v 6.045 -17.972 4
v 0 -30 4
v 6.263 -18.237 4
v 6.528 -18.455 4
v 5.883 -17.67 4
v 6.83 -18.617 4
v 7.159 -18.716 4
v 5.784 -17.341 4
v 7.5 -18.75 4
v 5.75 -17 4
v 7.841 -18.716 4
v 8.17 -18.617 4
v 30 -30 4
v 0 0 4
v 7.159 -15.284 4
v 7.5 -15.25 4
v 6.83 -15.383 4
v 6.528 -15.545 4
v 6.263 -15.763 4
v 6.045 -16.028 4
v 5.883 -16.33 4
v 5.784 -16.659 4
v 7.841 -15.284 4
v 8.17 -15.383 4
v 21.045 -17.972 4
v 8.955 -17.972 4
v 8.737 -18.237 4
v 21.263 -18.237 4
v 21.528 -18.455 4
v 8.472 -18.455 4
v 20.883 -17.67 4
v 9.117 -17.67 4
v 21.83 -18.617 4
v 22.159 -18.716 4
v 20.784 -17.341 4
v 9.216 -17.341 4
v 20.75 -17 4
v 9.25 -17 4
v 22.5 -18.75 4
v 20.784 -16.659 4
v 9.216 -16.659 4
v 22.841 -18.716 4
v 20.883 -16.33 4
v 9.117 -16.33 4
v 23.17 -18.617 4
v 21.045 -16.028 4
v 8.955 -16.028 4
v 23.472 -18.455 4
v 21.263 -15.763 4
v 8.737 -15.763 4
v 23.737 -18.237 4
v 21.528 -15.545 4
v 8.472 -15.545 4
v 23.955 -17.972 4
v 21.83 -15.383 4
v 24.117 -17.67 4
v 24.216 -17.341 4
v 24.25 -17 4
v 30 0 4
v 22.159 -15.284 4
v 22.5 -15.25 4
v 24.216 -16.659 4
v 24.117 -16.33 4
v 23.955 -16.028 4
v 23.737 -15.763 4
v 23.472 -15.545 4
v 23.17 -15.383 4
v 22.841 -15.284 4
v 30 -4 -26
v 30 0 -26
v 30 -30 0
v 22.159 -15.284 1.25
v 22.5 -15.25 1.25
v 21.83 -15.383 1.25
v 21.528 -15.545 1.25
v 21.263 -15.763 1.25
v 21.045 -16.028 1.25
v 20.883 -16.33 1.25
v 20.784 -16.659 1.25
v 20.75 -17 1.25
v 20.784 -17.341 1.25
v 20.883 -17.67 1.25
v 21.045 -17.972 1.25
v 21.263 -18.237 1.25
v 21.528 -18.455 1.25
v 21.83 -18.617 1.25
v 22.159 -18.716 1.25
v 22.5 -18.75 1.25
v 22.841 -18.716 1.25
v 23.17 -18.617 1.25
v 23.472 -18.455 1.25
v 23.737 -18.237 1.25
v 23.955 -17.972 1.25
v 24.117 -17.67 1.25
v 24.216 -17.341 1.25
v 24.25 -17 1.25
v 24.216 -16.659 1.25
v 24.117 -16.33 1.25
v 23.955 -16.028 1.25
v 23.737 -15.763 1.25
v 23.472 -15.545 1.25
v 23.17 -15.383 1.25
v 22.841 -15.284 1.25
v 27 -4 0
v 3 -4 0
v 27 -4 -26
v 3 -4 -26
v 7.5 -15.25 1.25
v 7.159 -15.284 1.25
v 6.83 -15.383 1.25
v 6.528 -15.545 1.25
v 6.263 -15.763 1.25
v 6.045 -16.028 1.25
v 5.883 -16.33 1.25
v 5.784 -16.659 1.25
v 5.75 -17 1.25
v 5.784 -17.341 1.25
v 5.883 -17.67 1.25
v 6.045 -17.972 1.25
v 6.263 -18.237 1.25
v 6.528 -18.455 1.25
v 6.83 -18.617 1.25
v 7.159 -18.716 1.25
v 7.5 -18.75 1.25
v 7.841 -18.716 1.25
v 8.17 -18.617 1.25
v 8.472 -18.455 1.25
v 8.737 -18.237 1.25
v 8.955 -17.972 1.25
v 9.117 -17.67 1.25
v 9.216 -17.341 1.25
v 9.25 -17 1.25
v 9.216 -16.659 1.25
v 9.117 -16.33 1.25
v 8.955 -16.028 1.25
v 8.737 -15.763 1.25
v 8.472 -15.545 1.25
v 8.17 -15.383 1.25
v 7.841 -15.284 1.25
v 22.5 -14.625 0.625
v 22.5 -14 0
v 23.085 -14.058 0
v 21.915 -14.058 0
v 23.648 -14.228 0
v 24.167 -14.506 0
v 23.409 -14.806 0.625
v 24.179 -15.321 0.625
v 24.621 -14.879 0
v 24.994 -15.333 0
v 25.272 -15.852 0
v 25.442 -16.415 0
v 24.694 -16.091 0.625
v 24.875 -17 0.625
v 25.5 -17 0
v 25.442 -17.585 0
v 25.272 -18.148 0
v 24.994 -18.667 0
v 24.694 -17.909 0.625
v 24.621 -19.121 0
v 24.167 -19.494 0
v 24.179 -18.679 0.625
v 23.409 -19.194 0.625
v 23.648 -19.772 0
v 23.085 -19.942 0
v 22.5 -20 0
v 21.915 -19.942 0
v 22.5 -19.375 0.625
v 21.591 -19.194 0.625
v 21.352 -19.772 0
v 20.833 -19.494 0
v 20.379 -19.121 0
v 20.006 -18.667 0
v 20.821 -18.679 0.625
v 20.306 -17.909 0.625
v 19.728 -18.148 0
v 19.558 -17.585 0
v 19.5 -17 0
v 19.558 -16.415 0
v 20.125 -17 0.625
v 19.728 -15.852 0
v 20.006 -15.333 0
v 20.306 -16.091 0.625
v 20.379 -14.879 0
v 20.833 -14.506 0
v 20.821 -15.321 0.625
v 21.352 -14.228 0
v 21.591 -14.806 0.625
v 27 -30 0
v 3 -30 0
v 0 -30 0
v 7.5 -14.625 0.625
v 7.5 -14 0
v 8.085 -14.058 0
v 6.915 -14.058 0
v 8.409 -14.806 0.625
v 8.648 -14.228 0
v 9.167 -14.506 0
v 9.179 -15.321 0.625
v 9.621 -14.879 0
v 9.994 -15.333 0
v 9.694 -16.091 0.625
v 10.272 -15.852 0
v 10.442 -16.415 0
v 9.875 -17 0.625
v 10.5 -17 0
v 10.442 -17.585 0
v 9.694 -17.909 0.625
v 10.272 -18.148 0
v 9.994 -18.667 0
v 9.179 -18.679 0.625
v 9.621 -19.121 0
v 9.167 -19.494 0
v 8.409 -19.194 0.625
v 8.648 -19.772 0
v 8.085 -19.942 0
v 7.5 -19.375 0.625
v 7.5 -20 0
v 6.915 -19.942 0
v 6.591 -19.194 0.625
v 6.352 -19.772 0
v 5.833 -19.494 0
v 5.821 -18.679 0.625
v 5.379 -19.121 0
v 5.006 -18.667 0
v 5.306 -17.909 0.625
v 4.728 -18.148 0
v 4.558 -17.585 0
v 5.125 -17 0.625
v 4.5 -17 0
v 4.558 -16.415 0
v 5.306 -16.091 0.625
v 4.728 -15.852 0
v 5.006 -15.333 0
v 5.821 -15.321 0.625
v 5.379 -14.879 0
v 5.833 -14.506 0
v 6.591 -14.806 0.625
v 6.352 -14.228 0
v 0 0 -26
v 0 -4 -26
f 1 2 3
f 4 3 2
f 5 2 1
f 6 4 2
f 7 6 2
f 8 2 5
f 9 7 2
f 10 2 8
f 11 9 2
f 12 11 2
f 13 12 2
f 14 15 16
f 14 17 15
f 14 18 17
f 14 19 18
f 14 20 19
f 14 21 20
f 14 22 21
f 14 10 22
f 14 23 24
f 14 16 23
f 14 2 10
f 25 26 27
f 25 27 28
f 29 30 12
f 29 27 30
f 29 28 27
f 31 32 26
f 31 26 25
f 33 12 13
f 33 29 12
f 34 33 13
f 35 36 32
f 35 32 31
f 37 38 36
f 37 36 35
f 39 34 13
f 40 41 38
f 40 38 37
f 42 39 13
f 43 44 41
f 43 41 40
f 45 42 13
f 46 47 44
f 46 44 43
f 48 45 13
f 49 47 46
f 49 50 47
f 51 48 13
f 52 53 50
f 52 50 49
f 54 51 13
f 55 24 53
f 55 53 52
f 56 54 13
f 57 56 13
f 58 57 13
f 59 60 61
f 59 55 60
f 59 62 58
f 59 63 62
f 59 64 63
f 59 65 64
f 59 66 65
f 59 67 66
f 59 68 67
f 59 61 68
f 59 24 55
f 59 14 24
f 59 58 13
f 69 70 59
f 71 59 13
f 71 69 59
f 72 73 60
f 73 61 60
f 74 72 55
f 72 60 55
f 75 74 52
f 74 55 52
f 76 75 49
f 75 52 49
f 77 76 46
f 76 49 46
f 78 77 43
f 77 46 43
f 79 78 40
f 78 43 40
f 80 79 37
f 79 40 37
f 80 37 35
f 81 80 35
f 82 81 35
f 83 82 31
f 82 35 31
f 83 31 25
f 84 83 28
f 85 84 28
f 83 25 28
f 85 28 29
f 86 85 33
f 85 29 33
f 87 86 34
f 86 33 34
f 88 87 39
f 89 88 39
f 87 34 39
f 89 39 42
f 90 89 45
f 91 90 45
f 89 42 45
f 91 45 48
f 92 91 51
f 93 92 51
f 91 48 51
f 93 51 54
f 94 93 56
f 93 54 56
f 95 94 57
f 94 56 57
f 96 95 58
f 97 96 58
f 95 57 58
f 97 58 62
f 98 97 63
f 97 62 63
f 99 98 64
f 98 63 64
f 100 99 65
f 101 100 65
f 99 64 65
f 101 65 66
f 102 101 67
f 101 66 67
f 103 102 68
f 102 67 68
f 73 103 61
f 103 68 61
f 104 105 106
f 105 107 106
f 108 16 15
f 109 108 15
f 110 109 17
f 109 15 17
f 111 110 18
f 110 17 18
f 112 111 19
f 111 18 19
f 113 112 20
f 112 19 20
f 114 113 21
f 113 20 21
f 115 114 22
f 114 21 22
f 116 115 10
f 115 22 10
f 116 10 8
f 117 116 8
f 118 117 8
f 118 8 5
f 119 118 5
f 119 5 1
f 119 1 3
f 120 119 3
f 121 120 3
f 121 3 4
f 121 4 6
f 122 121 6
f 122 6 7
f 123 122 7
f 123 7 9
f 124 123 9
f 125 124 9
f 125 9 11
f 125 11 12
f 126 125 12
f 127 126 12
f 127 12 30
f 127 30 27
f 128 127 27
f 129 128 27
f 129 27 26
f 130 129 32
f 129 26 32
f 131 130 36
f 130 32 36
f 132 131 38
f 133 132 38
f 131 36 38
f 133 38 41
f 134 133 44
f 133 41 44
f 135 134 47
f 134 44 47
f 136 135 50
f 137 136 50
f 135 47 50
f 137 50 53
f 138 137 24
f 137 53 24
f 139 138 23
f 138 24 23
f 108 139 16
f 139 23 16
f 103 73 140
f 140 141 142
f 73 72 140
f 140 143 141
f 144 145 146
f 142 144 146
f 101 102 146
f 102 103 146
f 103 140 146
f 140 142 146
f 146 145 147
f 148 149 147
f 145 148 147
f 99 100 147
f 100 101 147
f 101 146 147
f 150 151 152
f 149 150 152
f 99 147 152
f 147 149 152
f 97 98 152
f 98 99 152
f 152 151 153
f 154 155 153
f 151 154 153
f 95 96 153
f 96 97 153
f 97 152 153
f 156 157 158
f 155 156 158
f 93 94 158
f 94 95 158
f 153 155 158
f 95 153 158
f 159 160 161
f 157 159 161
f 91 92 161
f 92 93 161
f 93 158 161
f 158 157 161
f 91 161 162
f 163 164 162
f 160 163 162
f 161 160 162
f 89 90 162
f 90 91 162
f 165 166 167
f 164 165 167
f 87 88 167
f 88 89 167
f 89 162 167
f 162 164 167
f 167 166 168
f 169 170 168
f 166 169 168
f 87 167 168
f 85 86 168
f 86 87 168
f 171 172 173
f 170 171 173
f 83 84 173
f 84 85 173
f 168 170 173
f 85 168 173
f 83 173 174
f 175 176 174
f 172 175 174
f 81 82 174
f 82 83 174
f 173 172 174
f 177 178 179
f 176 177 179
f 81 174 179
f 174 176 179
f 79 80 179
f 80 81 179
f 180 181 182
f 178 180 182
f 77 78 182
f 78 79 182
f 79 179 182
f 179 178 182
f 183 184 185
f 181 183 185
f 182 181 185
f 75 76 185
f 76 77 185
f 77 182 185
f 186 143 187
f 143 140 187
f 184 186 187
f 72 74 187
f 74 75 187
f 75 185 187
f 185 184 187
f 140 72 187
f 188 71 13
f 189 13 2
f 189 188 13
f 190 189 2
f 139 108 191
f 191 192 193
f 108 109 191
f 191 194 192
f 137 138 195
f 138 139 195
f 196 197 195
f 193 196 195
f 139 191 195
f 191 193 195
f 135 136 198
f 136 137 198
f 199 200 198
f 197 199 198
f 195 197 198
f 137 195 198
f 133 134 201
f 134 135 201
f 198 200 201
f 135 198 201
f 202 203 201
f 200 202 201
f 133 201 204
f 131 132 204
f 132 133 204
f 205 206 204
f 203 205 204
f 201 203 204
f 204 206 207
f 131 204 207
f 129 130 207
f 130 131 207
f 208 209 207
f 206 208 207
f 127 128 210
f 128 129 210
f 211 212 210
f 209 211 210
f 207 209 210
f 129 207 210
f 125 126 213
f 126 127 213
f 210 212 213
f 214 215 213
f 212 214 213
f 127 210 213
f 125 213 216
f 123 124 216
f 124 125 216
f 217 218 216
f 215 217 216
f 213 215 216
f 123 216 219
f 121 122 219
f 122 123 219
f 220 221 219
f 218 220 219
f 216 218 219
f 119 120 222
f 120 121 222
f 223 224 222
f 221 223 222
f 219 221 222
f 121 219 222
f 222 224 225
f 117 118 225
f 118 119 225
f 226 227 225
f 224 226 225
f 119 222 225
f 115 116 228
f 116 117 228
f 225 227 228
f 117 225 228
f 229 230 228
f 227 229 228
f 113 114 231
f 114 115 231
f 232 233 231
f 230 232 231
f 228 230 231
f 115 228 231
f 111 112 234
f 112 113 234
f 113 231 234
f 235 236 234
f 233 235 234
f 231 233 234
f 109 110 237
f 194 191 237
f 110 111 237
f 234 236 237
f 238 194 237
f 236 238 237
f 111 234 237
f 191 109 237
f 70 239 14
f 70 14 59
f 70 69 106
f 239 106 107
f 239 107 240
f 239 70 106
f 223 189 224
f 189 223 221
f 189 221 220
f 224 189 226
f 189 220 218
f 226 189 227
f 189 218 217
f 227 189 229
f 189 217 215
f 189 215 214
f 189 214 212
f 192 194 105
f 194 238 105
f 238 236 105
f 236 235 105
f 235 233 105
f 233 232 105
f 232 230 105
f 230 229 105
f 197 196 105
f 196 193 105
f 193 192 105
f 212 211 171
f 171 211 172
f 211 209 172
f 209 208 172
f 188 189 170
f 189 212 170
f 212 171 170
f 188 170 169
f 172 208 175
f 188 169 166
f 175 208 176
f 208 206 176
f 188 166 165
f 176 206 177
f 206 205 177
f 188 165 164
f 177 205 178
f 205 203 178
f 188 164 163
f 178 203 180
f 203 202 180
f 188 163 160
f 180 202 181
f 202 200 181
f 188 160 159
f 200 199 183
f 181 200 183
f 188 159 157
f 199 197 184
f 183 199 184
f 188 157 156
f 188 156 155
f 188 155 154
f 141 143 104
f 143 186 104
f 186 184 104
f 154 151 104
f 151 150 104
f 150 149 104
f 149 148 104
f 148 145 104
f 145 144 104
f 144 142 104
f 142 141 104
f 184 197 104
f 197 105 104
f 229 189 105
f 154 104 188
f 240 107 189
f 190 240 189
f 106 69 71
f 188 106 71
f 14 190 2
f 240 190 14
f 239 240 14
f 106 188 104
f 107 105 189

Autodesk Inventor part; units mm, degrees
ref_plane "YZ Plane" through (0, 0, 0) normal (1, 0, 0) x (0, 1, 0)
ref_plane "XZ Plane" through (0, 0, 0) normal (0, 1, 0) x (-1, 0, 0)
ref_plane "XY Plane" through (0, 0, 0) normal (0, 0, 1) x (1, 0, 0)
sketch "Boceto1" plane through (0, 0, 0) normal (0, 0, 1) x (1, 0, 0)
  line L0 (0, 0) -> (30, 0)
  line L1 (30, 0) -> (30, -30)
  line L2 (30, -30) -> (0, -30)
  line L3 (0, -30) -> (0, 0)
  dimension "d0" = 30
  dimension "d1" = 30
extrude "Extrusión1" add sketch "Boceto1" along normal blind 4
sketch "Boceto2" plane through (0, 0, 0) normal (0, 1, 0) x (1, 0, 0)
  line L0 (30, -4) -> (0, -4) projected
  line L1 (0, -4) -> (30, -4)
  line L2 (30, -4) -> (30, 26)
  line L3 (30, 26) -> (0, 26)
  line L4 (0, 26) -> (0, -4)
  point P0 (0, 0)
  dimension "d4" = 30
extrude "Extrusión2" add sketch "Boceto2" against normal blind 4
sketch "Boceto3" plane through (0, 0, 0) normal (0, 0, -1) x (-1, 0, 0)
  line L0 (0, -4) -> (-30, -4) projected
  line L1 (-30, -30) -> (-30, -4) projected
  line L2 (0, -30) -> (-30, -30) projected
  line L3 (0, -4) -> (0, -30) projected
  line L4 (0, -30) -> (-30, -30) projected
  line L5 (-15, -30) -> (-15, -4)
  line L6 (0, -4) -> (0, -30) projected
  line L7 (0, -17) -> (-30, -17)
  line L8 (-30, -17) -> (-22.5, -17)
  circle A0 centre (-22.5, -17) radius 3
  line L9 (0, -17) -> (-7.5, -17)
  circle A1 centre (-7.5, -17) radius 3
  point P0 (0, 0)
  dimension "d7" = 7.5
  dimension "d8" = 6
  dimension "d9" = 7.5
  dimension "d10" = 6
hole "Agujero1" at (22.5, -17, 0) at (7.5, -17, 0) direction (0, 0, 1) diameter 3.5 end through all countersink diameter 6 countersink angle 90
sketch "Boceto4" plane through (0, 0, 0) normal (0, 0, -1) x (-1, 0, 0)
  line L0 (0, -30) -> (-30, -30) projected
  line L1 (0, 0) -> (-3, 0)
  line L2 (-3, 0) -> (-3, -30)
  line L3 (-3, -30) -> (0, -30)
  line L4 (0, -30) -> (0, 0)
  line L5 (-30, -30) -> (-27, -30)
  line L6 (-27, -30) -> (-27, 0)
  line L7 (-27, 0) -> (-30, 0)
  line L8 (-30, 0) -> (-30, -30)
  dimension "d18" = 3
  dimension "d19" = 3
extrude "Extrusión3" add sketch "Boceto4" along normal up to surface (26 mm away)
sketch "Boceto5" plane through (30, -30, 4) normal (1, 0, 0) x (0, 0, -1)
  line L0 (30, 26) -> (4, 0)
  line L1 (30, 30) -> (0, 30) projected
  line L2 (0, 0) -> (0, 30) projected
  line L3 (30, 0) -> (0, 0) projected
  line L4 (30, 30) -> (30, 0) projected
  point P0 (4, 30)
extrude "Extrusión4" cut sketch "Boceto5" against normal through all contours L4 L3 L0
properties part number "Union"
